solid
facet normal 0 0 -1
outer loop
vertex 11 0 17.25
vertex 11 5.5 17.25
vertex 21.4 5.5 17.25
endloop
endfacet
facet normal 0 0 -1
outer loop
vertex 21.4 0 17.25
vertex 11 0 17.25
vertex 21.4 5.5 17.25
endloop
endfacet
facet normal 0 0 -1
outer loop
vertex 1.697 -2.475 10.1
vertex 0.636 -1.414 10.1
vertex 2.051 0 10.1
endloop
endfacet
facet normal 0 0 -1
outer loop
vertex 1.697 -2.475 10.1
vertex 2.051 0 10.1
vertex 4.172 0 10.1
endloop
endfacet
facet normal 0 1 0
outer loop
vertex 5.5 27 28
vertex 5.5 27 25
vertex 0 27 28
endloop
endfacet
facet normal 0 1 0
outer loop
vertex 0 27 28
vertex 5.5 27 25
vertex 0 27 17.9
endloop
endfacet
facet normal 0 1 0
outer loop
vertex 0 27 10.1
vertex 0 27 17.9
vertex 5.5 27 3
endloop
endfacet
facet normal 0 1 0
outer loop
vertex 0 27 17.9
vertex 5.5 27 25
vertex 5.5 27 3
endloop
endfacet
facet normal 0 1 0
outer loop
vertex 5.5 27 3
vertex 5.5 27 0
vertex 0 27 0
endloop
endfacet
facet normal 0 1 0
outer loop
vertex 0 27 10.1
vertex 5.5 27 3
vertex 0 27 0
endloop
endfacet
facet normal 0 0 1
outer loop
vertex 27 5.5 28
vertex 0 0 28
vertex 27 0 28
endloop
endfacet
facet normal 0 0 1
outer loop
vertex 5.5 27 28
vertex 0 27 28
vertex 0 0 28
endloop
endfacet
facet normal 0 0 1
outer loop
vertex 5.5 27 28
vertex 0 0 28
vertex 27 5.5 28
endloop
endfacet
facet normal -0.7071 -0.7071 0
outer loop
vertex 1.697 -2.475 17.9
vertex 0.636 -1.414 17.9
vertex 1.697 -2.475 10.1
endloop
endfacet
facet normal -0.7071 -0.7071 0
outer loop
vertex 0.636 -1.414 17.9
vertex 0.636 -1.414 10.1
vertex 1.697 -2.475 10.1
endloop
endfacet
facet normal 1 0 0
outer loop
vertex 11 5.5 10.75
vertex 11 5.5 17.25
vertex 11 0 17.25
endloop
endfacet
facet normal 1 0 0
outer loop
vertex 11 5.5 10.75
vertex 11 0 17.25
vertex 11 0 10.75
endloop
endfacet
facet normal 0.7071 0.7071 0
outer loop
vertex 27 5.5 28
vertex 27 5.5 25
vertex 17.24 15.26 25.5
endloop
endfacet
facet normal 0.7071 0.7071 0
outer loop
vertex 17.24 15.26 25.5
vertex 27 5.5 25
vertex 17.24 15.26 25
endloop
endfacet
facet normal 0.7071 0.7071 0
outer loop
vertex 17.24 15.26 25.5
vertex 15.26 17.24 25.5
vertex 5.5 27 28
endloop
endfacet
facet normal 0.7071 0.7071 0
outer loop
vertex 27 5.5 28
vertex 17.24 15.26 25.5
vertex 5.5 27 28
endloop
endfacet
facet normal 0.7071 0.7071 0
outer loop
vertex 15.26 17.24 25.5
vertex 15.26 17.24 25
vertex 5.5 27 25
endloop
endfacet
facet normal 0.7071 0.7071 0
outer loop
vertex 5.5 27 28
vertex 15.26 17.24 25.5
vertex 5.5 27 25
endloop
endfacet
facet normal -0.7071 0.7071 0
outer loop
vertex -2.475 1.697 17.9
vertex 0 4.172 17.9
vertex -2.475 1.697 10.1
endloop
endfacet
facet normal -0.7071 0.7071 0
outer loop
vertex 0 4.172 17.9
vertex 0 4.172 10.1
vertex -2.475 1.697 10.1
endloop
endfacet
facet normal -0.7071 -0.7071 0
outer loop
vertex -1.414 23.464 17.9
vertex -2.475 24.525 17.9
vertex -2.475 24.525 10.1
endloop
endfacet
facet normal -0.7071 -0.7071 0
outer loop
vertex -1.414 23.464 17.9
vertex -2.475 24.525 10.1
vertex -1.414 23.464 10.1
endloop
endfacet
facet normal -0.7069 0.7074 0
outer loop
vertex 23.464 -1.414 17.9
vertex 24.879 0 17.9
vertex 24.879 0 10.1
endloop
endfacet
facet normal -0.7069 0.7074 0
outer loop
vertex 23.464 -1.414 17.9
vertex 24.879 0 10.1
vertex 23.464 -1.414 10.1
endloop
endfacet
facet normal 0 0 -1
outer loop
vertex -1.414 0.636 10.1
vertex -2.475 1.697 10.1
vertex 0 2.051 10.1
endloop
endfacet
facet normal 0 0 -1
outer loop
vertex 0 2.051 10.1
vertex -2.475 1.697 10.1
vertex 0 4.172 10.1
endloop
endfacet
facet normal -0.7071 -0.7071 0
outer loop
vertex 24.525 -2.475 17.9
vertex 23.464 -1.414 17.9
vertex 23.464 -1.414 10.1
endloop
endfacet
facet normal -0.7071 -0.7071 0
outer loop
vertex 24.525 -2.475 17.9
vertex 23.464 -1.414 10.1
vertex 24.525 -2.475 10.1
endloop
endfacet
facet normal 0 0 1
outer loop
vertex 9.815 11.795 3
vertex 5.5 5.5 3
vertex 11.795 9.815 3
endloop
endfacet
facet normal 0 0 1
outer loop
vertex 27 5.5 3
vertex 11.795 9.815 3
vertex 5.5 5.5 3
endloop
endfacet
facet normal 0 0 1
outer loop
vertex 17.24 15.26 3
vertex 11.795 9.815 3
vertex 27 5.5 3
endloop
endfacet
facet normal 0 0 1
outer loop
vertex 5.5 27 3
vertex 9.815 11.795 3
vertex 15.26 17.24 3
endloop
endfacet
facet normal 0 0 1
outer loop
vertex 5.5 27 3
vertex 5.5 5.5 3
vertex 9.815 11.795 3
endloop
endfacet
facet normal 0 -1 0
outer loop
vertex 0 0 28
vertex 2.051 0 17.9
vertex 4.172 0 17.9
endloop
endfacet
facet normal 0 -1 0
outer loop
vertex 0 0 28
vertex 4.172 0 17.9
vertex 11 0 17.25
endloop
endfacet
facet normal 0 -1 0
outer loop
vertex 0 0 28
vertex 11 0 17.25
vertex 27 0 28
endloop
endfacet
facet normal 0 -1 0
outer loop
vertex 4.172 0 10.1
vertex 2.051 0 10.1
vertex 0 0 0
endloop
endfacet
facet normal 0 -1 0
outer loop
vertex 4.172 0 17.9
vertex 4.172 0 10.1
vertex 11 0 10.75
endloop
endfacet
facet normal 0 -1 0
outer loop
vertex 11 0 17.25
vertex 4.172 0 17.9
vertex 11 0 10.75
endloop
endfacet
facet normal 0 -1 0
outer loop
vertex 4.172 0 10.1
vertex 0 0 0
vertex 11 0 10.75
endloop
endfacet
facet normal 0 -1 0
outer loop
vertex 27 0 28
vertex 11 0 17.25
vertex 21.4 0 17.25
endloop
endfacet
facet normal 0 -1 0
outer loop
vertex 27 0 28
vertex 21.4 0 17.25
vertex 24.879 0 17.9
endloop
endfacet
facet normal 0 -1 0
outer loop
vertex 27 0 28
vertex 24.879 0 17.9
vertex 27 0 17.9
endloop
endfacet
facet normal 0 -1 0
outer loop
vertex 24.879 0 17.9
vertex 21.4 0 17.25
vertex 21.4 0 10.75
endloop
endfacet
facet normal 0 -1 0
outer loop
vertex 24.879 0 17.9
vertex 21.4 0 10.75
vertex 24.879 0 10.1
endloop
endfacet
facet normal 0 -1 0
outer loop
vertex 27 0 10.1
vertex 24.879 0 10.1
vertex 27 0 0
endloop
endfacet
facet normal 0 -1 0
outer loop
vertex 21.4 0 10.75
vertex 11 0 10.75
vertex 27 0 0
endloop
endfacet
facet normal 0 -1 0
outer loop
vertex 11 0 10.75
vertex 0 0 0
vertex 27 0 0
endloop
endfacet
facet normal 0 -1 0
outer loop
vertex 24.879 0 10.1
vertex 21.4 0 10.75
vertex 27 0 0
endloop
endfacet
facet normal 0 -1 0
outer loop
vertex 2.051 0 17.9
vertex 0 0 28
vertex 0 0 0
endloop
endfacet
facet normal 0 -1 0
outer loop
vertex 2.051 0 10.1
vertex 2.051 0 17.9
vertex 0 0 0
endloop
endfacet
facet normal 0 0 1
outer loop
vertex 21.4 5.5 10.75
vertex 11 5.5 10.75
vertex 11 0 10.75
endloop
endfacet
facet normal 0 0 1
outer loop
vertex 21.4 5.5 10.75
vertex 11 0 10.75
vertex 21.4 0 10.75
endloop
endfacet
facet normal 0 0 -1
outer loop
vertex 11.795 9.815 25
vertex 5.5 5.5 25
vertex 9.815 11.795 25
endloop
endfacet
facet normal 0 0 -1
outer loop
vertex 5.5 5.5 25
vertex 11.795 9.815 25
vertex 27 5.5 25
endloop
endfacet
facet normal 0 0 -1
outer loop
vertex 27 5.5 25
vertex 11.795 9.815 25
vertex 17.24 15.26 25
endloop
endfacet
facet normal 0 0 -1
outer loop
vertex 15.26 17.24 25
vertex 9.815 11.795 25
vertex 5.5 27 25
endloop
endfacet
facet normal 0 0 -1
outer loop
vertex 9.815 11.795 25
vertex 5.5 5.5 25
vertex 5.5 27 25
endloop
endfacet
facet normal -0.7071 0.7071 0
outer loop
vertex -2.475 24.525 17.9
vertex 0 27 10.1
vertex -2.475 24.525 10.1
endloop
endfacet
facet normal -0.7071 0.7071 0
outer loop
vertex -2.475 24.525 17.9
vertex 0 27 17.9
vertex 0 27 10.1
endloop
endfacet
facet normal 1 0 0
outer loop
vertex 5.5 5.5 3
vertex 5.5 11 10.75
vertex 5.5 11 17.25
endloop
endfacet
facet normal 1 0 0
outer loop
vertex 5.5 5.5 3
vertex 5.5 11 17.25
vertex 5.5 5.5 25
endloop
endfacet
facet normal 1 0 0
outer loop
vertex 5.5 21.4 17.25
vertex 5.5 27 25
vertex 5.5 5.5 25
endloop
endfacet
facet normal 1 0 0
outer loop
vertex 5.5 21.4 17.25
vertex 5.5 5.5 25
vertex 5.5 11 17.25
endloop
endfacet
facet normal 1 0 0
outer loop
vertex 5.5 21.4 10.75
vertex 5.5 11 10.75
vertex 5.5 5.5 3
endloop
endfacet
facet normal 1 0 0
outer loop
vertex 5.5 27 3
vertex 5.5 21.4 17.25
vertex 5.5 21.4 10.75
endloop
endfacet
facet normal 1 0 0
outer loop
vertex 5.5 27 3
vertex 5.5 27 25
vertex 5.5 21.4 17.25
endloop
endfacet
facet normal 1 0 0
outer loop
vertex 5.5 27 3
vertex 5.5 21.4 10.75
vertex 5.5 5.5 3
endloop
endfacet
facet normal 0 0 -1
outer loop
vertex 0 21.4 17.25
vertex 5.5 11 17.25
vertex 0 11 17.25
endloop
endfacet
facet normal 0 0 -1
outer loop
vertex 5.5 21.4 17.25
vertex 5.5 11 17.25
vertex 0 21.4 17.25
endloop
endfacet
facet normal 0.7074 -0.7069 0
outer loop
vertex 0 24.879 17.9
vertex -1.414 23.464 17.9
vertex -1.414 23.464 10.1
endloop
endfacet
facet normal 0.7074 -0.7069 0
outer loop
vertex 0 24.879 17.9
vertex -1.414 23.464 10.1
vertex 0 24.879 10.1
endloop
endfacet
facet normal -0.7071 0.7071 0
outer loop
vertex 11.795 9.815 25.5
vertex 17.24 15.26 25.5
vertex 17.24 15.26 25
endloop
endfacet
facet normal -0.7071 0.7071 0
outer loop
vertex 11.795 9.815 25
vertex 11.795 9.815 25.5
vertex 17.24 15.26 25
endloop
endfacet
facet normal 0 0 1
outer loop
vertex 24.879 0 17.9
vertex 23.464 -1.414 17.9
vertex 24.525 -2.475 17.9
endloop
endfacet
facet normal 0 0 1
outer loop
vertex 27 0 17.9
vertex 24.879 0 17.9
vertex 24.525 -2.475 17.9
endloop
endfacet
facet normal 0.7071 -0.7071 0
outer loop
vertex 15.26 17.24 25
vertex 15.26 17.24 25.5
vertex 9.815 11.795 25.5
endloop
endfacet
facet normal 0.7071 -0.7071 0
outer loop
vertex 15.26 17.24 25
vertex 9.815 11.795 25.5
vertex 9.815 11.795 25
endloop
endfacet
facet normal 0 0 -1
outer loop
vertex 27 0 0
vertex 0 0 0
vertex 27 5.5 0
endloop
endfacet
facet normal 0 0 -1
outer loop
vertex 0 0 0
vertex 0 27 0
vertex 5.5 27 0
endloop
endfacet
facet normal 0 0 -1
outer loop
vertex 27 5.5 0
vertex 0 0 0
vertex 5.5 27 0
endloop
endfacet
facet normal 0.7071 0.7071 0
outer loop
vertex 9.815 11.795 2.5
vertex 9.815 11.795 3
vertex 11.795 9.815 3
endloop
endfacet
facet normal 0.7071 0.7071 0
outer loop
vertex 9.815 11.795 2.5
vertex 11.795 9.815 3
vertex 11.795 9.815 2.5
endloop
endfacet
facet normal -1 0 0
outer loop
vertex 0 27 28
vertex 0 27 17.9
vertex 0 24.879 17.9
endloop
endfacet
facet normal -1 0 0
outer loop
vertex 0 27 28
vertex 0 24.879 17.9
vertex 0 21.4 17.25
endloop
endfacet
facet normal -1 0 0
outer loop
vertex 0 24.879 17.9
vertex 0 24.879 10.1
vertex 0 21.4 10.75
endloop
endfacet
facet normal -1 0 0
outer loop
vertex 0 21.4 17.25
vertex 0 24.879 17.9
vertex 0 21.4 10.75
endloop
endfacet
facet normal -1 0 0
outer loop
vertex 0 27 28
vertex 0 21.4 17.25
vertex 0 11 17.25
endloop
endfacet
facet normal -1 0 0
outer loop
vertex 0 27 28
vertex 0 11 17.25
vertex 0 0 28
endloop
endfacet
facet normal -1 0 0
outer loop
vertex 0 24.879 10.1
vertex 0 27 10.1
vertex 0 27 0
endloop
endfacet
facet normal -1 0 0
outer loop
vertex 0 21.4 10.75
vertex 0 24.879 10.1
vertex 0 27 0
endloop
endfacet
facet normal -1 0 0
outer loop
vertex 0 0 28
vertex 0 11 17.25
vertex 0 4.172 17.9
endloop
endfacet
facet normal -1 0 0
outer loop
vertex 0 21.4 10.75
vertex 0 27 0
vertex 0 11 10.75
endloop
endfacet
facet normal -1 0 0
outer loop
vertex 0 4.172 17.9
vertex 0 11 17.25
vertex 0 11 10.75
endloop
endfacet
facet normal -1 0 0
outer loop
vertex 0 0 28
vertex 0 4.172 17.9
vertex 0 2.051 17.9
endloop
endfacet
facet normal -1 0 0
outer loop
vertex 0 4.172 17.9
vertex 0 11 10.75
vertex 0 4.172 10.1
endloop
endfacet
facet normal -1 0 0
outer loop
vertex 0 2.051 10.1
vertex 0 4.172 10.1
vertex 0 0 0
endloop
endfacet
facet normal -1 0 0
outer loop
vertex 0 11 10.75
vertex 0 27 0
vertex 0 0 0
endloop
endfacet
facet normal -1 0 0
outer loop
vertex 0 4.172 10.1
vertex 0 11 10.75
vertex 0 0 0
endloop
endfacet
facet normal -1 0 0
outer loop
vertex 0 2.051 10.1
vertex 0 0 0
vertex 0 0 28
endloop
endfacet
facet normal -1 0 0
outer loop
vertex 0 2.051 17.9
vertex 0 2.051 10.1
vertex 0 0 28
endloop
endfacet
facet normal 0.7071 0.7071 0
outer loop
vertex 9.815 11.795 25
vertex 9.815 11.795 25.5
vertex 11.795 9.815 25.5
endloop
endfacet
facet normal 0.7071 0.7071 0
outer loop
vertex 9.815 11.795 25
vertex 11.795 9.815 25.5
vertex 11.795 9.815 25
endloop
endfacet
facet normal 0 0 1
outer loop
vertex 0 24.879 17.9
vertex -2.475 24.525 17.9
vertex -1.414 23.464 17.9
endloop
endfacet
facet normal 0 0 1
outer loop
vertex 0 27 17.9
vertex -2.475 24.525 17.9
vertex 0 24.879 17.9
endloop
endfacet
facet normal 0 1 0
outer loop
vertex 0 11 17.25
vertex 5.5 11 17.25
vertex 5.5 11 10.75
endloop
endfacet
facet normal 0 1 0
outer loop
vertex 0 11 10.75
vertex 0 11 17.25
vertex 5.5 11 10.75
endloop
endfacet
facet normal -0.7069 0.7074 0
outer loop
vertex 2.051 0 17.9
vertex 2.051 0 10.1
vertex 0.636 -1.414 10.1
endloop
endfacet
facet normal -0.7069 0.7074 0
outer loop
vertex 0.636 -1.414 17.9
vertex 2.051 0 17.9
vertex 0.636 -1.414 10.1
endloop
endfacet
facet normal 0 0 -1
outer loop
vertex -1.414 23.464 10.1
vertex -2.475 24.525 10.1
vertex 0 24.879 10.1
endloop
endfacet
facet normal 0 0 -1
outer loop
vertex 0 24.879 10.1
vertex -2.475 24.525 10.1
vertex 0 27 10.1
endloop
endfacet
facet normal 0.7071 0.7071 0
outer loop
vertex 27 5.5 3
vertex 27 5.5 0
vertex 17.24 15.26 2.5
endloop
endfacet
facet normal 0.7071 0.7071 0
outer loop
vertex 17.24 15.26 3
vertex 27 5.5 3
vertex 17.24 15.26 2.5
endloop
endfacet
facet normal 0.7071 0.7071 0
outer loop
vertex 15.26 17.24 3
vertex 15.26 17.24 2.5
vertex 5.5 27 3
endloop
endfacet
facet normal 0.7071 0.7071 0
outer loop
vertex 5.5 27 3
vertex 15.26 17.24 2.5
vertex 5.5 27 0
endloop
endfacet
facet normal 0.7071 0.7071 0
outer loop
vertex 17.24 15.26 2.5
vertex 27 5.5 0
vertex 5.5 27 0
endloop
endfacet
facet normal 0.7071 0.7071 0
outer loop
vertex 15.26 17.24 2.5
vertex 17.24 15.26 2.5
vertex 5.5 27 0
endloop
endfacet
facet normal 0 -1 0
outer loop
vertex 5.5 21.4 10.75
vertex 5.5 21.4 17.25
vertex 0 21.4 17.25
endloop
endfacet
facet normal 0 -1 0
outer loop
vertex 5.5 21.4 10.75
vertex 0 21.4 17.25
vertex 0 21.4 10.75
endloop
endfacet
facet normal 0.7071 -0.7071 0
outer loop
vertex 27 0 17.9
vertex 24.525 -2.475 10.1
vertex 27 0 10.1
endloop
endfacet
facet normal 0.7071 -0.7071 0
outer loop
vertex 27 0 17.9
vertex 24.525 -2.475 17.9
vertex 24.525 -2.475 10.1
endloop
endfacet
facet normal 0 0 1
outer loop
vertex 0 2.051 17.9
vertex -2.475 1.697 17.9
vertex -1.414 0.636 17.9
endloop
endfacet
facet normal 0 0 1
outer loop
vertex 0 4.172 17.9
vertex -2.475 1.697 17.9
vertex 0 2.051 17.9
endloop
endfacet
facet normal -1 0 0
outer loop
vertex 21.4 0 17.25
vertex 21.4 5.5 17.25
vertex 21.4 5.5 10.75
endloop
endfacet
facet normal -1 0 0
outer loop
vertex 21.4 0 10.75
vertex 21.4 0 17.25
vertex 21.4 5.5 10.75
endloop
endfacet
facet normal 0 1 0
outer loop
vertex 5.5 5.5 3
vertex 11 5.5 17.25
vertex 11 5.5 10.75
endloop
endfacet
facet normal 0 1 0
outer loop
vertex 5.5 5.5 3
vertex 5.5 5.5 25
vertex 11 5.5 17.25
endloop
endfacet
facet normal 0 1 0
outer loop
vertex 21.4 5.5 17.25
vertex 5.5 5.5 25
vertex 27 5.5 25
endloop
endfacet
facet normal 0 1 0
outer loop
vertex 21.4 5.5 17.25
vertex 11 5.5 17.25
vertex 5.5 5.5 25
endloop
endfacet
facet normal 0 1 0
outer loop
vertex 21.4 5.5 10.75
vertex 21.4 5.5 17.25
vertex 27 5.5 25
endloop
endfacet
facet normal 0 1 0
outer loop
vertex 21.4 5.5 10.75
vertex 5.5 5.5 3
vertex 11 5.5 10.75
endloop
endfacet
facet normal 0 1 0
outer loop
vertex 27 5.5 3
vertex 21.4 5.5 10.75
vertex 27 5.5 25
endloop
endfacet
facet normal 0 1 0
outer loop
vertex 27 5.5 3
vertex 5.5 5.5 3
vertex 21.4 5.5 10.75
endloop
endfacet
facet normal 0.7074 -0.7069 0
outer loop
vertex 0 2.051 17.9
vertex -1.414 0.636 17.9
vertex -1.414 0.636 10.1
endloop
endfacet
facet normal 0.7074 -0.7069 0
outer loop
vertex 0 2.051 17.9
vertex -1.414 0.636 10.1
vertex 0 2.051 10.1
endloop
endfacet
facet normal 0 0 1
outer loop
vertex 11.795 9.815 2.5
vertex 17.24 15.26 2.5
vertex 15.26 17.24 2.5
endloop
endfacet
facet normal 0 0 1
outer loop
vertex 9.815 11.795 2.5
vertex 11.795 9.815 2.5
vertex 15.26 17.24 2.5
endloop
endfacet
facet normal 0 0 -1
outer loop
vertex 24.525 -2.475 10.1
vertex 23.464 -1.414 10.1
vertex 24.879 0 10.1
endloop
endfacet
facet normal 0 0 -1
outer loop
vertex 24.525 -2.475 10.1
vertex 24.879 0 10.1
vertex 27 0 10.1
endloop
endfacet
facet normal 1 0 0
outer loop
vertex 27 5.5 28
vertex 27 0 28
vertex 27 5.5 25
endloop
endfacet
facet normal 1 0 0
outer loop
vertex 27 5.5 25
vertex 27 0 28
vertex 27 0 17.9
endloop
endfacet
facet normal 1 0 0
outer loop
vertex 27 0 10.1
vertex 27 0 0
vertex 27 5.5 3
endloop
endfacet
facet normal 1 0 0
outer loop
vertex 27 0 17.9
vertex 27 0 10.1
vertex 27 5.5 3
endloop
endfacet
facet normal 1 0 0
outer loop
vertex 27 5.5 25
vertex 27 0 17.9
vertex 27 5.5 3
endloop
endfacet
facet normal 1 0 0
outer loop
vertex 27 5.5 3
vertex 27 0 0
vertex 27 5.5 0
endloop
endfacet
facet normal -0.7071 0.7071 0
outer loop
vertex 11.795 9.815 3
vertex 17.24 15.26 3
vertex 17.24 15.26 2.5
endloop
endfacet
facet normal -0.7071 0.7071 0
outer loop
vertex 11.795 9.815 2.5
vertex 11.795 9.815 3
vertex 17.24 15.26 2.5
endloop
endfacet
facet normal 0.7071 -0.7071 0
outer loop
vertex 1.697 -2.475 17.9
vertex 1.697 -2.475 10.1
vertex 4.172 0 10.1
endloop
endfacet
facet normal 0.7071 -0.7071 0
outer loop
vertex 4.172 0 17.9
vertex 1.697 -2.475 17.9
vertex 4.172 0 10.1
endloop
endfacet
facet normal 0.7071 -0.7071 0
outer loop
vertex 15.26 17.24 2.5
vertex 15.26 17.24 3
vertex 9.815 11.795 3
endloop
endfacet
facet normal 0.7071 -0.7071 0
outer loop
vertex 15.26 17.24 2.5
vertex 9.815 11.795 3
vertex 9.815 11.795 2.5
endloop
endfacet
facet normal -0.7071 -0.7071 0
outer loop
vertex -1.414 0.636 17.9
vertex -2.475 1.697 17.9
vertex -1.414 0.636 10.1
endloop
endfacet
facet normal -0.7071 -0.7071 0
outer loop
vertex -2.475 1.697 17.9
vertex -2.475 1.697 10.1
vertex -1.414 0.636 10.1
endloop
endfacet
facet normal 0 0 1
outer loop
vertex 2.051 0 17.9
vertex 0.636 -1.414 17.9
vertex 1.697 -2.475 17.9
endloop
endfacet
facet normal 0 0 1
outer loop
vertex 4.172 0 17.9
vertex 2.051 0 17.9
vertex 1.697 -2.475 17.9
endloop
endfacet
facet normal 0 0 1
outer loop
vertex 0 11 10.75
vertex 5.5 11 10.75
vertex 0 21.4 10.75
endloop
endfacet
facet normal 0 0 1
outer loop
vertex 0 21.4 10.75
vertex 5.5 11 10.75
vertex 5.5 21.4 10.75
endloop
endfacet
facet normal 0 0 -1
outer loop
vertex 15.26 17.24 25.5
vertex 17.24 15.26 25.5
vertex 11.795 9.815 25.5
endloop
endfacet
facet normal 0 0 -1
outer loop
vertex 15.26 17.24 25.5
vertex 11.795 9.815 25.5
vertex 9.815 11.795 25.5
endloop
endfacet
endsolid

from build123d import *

# Parameters (mm, degrees)
BOSS_EXTRU_1_DEPTH      = 28
ESQUISSE2_W             = 21.5
ESQUISSE2_H             = 22
ENL_V_MAT_EXTRU_1_DEPTH = 21.5
ESQUISSE3_W             = 6.5
ESQUISSE3_H             = 10.4
ENL_V_MAT_EXTRU_2_DEPTH = 6.9
ESQUISSE4_W             = 10.4
ESQUISSE4_H             = 6.5
ENL_V_MAT_EXTRU_3_DEPTH = 18
ESQUISSE5_W             = 0.5
ESQUISSE5_H             = 2.8
ENL_V_MAT_EXTRU_4_DEPTH = 7.7
BOSS_EXTRU_2_DEPTH      = 3.9
BOSS_EXTRU_2_DEPTH_BACK = 3.9


with BuildPart() as part:
    # Esquisse1 → Boss.-Extru.1 (new body)
    with BuildSketch(Plane.XY):
        Polygon((0, 27), (0, 0), (27, 0), (27, 5.5), (5.5, 27), align=None)
    extrude(amount=BOSS_EXTRU_1_DEPTH)

    # Esquisse2 → Enlèv. mat.-Extru.1 (cut)
    with BuildSketch(Plane(origin=(0, 27, 0), x_dir=(1, 0, 0), z_dir=(0, 1, 0))):
        with Locations((16.25, -14)):
            Rectangle(ESQUISSE2_W, ESQUISSE2_H)
    extrude(amount=-ENL_V_MAT_EXTRU_1_DEPTH, mode=Mode.SUBTRACT)

    # Esquisse3 → Enlèv. mat.-Extru.2 (cut)
    with BuildSketch(Plane(origin=(5.5, 0, 0), x_dir=(0, 0, -1), z_dir=(1, 0, 0))):
        with Locations((-14, 16.2)):
            Rectangle(ESQUISSE3_W, ESQUISSE3_H)
    extrude(amount=-ENL_V_MAT_EXTRU_2_DEPTH, mode=Mode.SUBTRACT)

    # Esquisse4 → Enlèv. mat.-Extru.3 (cut)
    with BuildSketch(Plane(origin=(0, 5.5, 0), x_dir=(1, 0, 0), z_dir=(0, 1, 0))):
        with Locations((16.2, -14)):
            Rectangle(ESQUISSE4_W, ESQUISSE4_H)
    extrude(amount=-ENL_V_MAT_EXTRU_3_DEPTH, mode=Mode.SUBTRACT)

    # Esquisse5 → Enlèv. mat.-Extru.4 (cut)
    with BuildSketch(Plane(origin=(16.25, 16.25, 0), x_dir=(0, 0, -1), z_dir=(0.707106781, 0.707106781, 0))):
        with Locations((-25.25, 0)):
            Rectangle(ESQUISSE5_W, ESQUISSE5_H)
        with Locations((-2.75, 0)):
            Rectangle(ESQUISSE5_W, ESQUISSE5_H)
    extrude(amount=-ENL_V_MAT_EXTRU_4_DEPTH, mode=Mode.SUBTRACT)

    # Esquisse6 → Boss.-Extru.2 (add, two sides)
    with BuildSketch(Plane.XY.offset(14)) as boss_extru_2_sk:
        Polygon((0, 27), (-2.474873734, 24.525126266), (-1.414213562, 23.464466094), (1.060660172, 25.939339828), align=None)
        Polygon((0, 4.171930009), (-2.474873734, 1.697056275), (-1.414213562, 0.636396103), (1.060660172, 3.111269837), align=None)
        Polygon((3.111269837, 1.060660172), (0.636396103, -1.414213562), (1.697056275, -2.474873734), (4.171930009, 0), align=None)
        Polygon((25.939339828, 1.060660172), (23.464466094, -1.414213562), (24.525126266, -2.474873734), (27, 0), align=None)
    extrude(amount=BOSS_EXTRU_2_DEPTH)
    extrude(boss_extru_2_sk.sketch, amount=-BOSS_EXTRU_2_DEPTH_BACK)


solid = part.part
